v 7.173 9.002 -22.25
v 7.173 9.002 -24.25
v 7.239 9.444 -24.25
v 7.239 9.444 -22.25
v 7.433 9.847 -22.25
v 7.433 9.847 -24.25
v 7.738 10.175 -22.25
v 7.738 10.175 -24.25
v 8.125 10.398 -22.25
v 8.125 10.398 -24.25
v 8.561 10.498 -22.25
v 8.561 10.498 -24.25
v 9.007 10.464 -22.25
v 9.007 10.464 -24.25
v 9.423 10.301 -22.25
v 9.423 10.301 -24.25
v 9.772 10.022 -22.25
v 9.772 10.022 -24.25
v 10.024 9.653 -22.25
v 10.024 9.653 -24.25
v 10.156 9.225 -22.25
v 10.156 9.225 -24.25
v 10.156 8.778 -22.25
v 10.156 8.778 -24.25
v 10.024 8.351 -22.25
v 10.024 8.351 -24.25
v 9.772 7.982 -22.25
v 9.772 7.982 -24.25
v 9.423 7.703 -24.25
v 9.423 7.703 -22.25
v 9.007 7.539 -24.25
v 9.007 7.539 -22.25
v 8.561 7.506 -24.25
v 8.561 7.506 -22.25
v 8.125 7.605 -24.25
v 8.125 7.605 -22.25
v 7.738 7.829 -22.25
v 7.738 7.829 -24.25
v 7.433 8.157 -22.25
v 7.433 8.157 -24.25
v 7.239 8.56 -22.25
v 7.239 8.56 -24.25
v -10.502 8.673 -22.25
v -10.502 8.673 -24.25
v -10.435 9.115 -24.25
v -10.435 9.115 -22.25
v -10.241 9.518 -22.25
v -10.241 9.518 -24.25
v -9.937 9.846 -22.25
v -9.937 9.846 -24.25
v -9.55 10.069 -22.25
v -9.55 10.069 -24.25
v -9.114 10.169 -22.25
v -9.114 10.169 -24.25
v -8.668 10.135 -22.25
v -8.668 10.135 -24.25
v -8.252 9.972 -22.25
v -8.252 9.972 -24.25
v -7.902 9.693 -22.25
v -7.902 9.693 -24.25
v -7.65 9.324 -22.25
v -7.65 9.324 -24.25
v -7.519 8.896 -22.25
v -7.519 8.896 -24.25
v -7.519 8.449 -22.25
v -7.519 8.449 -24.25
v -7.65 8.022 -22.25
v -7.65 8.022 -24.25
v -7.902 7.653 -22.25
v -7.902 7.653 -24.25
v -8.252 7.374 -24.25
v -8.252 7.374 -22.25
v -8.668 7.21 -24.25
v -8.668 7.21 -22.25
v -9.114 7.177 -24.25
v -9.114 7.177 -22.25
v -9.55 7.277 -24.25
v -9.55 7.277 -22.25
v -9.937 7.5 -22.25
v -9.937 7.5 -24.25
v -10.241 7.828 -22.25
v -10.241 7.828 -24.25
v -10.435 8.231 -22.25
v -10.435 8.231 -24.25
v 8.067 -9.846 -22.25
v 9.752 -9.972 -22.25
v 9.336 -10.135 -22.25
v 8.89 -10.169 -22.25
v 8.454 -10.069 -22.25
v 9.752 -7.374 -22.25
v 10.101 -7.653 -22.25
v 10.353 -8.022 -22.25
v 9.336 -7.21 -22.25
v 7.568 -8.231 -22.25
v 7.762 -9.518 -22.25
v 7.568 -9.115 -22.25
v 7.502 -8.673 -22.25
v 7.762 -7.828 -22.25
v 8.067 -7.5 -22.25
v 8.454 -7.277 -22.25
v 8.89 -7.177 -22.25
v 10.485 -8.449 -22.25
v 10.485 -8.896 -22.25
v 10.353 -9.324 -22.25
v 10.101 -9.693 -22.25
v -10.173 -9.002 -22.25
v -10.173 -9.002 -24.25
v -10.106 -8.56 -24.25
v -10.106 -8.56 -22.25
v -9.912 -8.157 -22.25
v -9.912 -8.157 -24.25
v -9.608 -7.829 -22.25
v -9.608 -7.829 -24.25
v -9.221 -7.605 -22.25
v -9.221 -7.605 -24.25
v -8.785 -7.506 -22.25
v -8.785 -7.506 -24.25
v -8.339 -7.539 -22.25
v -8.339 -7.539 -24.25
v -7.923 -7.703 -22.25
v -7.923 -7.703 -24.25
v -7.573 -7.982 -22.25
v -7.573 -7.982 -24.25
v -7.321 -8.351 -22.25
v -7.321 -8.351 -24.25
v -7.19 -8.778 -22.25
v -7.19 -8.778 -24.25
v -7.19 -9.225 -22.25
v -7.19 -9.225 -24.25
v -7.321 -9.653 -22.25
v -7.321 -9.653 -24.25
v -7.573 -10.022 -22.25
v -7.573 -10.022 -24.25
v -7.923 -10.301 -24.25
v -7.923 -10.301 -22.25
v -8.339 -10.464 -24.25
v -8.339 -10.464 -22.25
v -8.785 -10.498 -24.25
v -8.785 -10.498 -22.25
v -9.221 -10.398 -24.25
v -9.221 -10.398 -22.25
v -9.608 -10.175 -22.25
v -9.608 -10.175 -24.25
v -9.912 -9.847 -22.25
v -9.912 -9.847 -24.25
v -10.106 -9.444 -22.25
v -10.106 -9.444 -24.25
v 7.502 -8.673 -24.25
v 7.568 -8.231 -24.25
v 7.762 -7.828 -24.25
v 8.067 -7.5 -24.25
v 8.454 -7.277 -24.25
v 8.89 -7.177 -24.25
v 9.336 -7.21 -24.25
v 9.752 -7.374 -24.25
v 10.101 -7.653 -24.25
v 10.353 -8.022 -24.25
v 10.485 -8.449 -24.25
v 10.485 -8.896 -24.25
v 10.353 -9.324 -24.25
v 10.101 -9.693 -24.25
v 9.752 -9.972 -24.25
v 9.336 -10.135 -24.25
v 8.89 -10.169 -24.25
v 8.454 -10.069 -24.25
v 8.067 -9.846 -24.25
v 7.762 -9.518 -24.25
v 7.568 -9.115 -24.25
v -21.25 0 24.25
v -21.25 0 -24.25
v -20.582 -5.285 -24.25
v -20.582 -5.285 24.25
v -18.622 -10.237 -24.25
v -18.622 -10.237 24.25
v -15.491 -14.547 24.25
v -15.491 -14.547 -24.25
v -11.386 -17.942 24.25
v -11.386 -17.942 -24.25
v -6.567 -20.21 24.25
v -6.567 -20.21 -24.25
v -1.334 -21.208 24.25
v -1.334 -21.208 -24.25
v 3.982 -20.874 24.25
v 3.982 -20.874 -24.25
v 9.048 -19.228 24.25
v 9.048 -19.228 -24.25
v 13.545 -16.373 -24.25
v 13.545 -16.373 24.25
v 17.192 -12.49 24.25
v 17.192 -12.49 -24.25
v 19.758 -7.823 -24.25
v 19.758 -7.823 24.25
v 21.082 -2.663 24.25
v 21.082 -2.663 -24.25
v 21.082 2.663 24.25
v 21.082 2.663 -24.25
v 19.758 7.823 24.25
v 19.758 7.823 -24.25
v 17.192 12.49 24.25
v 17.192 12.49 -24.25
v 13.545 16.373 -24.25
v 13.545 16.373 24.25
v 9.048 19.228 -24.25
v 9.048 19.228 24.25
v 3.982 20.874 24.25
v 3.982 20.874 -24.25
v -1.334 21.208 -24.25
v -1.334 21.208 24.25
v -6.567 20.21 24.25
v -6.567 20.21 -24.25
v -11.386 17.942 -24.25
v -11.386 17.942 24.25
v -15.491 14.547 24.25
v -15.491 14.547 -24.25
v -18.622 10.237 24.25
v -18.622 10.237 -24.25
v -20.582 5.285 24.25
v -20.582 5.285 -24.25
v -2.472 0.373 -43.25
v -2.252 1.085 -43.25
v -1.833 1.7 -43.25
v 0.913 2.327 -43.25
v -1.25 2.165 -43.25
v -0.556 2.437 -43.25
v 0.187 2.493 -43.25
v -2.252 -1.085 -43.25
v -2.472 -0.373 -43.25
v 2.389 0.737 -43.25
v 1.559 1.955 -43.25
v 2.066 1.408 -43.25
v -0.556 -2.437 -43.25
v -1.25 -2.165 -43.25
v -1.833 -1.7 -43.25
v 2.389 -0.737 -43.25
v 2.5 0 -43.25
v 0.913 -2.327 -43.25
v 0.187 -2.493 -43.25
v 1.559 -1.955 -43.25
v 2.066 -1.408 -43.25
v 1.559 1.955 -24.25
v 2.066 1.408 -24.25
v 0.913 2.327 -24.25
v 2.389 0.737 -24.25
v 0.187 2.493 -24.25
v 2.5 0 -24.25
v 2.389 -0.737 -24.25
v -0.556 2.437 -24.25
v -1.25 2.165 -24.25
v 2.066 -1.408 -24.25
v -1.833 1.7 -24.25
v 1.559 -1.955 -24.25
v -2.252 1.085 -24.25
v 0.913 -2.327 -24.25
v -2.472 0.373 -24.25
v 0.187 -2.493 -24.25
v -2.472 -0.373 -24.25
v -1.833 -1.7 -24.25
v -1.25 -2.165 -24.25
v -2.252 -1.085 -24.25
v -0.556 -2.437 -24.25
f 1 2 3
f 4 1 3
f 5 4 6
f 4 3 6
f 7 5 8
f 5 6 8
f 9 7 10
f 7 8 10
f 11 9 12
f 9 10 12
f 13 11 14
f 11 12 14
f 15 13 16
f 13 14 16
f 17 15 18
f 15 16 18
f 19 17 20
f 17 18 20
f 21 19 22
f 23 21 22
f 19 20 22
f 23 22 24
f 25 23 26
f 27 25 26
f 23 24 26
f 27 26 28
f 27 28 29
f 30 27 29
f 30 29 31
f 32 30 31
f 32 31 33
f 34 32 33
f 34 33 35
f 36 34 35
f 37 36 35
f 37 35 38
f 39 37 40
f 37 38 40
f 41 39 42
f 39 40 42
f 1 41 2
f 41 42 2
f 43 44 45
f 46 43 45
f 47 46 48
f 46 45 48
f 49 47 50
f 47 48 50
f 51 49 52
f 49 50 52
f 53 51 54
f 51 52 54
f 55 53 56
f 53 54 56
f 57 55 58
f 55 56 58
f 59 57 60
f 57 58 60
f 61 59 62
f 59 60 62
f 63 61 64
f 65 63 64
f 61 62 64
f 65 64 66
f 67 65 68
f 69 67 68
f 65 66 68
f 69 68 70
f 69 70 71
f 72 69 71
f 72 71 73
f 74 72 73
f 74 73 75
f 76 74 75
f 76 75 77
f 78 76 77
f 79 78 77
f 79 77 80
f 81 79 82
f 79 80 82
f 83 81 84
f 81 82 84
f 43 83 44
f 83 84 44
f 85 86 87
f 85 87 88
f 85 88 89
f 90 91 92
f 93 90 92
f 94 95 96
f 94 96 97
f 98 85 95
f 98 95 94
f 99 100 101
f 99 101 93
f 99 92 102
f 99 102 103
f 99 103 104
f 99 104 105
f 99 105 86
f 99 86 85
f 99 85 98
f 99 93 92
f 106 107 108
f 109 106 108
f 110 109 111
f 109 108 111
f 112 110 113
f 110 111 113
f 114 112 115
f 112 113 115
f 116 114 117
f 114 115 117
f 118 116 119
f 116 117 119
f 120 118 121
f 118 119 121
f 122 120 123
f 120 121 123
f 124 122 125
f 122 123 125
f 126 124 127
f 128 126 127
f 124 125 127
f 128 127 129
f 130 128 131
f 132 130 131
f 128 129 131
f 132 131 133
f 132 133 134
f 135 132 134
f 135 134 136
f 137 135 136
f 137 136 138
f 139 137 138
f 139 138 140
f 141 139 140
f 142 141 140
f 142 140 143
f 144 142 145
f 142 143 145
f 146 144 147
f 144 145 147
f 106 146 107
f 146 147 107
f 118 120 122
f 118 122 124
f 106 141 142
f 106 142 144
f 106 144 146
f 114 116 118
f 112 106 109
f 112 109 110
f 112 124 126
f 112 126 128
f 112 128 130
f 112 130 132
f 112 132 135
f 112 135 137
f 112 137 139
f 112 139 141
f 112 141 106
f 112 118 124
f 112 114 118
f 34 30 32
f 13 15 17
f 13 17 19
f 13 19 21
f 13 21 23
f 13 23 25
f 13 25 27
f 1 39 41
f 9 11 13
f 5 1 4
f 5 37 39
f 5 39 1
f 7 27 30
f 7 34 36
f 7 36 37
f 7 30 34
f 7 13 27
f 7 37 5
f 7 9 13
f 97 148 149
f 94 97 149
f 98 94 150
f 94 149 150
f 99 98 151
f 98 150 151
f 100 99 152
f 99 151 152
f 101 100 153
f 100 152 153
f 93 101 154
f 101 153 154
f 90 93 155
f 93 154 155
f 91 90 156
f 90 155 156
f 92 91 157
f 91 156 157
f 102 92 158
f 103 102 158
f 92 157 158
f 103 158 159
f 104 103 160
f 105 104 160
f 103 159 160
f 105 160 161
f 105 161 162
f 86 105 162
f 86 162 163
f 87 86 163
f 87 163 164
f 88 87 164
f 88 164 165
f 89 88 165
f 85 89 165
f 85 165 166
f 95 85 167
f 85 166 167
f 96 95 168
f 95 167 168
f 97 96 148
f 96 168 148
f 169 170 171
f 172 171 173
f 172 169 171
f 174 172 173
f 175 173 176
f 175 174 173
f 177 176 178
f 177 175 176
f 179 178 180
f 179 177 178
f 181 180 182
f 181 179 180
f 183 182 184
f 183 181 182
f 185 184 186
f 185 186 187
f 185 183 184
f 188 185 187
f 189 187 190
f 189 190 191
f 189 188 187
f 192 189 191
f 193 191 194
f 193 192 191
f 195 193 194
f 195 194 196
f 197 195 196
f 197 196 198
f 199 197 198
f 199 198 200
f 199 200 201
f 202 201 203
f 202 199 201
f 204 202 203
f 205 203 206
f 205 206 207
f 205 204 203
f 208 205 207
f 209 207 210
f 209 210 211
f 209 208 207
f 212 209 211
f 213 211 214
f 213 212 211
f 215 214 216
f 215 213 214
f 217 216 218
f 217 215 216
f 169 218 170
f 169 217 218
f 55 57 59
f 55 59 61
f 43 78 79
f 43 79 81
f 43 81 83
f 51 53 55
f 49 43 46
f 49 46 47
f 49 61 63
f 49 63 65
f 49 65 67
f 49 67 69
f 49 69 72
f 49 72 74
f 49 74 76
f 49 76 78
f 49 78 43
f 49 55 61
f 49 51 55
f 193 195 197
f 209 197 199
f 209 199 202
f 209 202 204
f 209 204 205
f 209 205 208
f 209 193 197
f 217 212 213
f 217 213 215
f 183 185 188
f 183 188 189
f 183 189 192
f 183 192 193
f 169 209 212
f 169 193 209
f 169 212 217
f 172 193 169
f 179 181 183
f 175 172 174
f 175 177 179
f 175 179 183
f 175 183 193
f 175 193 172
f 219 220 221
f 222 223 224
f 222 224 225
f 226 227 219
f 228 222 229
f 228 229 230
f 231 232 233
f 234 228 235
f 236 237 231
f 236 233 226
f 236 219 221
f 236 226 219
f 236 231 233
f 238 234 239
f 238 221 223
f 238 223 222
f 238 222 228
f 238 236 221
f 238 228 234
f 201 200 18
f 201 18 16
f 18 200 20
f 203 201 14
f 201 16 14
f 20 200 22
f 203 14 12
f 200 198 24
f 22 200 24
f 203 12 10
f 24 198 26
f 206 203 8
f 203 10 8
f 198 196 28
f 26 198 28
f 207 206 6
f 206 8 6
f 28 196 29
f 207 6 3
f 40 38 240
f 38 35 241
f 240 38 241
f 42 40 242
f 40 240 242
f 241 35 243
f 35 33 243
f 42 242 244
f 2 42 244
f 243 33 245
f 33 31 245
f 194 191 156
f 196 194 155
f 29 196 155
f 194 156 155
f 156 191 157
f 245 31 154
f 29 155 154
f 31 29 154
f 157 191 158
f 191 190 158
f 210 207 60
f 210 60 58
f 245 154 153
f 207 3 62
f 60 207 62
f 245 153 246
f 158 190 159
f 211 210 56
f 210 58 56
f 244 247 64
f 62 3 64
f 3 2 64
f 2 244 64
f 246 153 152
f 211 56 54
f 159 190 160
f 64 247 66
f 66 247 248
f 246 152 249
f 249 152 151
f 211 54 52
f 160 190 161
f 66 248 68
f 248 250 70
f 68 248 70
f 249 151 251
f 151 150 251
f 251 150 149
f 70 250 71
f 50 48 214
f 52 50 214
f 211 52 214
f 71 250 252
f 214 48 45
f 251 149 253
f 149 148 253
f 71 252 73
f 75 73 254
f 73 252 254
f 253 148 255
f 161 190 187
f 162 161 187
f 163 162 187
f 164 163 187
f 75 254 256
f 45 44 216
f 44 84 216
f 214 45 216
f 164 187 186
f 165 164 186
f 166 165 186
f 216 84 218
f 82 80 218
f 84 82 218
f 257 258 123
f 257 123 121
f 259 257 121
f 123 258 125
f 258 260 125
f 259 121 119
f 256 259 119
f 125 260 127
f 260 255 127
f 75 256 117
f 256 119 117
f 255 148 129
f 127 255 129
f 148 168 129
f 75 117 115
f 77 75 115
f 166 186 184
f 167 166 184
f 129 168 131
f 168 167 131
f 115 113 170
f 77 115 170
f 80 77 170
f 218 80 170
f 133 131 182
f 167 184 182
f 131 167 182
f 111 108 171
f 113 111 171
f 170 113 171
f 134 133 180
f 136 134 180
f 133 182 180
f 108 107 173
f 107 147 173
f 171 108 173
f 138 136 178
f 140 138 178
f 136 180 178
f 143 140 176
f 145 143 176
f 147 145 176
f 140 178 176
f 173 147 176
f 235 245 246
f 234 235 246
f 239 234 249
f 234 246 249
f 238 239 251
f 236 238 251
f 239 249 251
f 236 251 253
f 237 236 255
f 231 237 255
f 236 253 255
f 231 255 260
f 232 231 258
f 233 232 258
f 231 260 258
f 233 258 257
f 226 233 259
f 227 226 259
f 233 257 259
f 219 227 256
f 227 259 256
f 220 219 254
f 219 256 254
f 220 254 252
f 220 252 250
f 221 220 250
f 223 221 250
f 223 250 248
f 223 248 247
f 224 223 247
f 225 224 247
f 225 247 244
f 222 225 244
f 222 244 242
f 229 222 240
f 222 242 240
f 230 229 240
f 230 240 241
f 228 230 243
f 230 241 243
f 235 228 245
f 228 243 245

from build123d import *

# Parameters (mm, degrees)
ESBO_O1_R                = 21.25
RESSALTO_EXTRUS_O1_DEPTH = 24.25
ESBO_O2_R                = 2.5
RESSALTO_EXTRUS_O2_DEPTH = 19
ESBO_O3_R                = 1.5
CORTE_EXTRUS_O1_DEPTH    = 2


with BuildPart() as part:
    # Esboço1 → Ressalto-extrusão1 (new, symmetric)
    with BuildSketch(Plane.XY):
        with Locations(Location((0, 0, 0), (0, 0, 180))):
            Circle(ESBO_O1_R)
    extrude(amount=RESSALTO_EXTRUS_O1_DEPTH, both=True)

    # Esboço2 → Ressalto-extrusão2 (add)
    with BuildSketch(Plane(origin=(0, 0, -24.25), x_dir=(-1, 0, 0), z_dir=(0, 0, -1))):
        with Locations(Location((0, 0, 0), (0, 0, 180))):
            Circle(ESBO_O2_R)
    extrude(amount=RESSALTO_EXTRUS_O2_DEPTH)

    # Esboço3 → Corte-extrusão1 (cut)
    with BuildSketch(Plane(origin=(0, 0, -24.25), x_dir=(-1, 0, 0), z_dir=(0, 0, -1))):
        with Locations((-8.672819651, 9.001788672)):
            Circle(ESBO_O3_R)
        with Locations((9.001788672, 8.672819651)):
            Circle(ESBO_O3_R)
        with Locations((8.672819651, -9.001788672)):
            Circle(ESBO_O3_R)
        with Locations((-9.001788672, -8.672819651)):
            Circle(ESBO_O3_R)
    extrude(amount=-CORTE_EXTRUS_O1_DEPTH, mode=Mode.SUBTRACT)


solid = part.part
